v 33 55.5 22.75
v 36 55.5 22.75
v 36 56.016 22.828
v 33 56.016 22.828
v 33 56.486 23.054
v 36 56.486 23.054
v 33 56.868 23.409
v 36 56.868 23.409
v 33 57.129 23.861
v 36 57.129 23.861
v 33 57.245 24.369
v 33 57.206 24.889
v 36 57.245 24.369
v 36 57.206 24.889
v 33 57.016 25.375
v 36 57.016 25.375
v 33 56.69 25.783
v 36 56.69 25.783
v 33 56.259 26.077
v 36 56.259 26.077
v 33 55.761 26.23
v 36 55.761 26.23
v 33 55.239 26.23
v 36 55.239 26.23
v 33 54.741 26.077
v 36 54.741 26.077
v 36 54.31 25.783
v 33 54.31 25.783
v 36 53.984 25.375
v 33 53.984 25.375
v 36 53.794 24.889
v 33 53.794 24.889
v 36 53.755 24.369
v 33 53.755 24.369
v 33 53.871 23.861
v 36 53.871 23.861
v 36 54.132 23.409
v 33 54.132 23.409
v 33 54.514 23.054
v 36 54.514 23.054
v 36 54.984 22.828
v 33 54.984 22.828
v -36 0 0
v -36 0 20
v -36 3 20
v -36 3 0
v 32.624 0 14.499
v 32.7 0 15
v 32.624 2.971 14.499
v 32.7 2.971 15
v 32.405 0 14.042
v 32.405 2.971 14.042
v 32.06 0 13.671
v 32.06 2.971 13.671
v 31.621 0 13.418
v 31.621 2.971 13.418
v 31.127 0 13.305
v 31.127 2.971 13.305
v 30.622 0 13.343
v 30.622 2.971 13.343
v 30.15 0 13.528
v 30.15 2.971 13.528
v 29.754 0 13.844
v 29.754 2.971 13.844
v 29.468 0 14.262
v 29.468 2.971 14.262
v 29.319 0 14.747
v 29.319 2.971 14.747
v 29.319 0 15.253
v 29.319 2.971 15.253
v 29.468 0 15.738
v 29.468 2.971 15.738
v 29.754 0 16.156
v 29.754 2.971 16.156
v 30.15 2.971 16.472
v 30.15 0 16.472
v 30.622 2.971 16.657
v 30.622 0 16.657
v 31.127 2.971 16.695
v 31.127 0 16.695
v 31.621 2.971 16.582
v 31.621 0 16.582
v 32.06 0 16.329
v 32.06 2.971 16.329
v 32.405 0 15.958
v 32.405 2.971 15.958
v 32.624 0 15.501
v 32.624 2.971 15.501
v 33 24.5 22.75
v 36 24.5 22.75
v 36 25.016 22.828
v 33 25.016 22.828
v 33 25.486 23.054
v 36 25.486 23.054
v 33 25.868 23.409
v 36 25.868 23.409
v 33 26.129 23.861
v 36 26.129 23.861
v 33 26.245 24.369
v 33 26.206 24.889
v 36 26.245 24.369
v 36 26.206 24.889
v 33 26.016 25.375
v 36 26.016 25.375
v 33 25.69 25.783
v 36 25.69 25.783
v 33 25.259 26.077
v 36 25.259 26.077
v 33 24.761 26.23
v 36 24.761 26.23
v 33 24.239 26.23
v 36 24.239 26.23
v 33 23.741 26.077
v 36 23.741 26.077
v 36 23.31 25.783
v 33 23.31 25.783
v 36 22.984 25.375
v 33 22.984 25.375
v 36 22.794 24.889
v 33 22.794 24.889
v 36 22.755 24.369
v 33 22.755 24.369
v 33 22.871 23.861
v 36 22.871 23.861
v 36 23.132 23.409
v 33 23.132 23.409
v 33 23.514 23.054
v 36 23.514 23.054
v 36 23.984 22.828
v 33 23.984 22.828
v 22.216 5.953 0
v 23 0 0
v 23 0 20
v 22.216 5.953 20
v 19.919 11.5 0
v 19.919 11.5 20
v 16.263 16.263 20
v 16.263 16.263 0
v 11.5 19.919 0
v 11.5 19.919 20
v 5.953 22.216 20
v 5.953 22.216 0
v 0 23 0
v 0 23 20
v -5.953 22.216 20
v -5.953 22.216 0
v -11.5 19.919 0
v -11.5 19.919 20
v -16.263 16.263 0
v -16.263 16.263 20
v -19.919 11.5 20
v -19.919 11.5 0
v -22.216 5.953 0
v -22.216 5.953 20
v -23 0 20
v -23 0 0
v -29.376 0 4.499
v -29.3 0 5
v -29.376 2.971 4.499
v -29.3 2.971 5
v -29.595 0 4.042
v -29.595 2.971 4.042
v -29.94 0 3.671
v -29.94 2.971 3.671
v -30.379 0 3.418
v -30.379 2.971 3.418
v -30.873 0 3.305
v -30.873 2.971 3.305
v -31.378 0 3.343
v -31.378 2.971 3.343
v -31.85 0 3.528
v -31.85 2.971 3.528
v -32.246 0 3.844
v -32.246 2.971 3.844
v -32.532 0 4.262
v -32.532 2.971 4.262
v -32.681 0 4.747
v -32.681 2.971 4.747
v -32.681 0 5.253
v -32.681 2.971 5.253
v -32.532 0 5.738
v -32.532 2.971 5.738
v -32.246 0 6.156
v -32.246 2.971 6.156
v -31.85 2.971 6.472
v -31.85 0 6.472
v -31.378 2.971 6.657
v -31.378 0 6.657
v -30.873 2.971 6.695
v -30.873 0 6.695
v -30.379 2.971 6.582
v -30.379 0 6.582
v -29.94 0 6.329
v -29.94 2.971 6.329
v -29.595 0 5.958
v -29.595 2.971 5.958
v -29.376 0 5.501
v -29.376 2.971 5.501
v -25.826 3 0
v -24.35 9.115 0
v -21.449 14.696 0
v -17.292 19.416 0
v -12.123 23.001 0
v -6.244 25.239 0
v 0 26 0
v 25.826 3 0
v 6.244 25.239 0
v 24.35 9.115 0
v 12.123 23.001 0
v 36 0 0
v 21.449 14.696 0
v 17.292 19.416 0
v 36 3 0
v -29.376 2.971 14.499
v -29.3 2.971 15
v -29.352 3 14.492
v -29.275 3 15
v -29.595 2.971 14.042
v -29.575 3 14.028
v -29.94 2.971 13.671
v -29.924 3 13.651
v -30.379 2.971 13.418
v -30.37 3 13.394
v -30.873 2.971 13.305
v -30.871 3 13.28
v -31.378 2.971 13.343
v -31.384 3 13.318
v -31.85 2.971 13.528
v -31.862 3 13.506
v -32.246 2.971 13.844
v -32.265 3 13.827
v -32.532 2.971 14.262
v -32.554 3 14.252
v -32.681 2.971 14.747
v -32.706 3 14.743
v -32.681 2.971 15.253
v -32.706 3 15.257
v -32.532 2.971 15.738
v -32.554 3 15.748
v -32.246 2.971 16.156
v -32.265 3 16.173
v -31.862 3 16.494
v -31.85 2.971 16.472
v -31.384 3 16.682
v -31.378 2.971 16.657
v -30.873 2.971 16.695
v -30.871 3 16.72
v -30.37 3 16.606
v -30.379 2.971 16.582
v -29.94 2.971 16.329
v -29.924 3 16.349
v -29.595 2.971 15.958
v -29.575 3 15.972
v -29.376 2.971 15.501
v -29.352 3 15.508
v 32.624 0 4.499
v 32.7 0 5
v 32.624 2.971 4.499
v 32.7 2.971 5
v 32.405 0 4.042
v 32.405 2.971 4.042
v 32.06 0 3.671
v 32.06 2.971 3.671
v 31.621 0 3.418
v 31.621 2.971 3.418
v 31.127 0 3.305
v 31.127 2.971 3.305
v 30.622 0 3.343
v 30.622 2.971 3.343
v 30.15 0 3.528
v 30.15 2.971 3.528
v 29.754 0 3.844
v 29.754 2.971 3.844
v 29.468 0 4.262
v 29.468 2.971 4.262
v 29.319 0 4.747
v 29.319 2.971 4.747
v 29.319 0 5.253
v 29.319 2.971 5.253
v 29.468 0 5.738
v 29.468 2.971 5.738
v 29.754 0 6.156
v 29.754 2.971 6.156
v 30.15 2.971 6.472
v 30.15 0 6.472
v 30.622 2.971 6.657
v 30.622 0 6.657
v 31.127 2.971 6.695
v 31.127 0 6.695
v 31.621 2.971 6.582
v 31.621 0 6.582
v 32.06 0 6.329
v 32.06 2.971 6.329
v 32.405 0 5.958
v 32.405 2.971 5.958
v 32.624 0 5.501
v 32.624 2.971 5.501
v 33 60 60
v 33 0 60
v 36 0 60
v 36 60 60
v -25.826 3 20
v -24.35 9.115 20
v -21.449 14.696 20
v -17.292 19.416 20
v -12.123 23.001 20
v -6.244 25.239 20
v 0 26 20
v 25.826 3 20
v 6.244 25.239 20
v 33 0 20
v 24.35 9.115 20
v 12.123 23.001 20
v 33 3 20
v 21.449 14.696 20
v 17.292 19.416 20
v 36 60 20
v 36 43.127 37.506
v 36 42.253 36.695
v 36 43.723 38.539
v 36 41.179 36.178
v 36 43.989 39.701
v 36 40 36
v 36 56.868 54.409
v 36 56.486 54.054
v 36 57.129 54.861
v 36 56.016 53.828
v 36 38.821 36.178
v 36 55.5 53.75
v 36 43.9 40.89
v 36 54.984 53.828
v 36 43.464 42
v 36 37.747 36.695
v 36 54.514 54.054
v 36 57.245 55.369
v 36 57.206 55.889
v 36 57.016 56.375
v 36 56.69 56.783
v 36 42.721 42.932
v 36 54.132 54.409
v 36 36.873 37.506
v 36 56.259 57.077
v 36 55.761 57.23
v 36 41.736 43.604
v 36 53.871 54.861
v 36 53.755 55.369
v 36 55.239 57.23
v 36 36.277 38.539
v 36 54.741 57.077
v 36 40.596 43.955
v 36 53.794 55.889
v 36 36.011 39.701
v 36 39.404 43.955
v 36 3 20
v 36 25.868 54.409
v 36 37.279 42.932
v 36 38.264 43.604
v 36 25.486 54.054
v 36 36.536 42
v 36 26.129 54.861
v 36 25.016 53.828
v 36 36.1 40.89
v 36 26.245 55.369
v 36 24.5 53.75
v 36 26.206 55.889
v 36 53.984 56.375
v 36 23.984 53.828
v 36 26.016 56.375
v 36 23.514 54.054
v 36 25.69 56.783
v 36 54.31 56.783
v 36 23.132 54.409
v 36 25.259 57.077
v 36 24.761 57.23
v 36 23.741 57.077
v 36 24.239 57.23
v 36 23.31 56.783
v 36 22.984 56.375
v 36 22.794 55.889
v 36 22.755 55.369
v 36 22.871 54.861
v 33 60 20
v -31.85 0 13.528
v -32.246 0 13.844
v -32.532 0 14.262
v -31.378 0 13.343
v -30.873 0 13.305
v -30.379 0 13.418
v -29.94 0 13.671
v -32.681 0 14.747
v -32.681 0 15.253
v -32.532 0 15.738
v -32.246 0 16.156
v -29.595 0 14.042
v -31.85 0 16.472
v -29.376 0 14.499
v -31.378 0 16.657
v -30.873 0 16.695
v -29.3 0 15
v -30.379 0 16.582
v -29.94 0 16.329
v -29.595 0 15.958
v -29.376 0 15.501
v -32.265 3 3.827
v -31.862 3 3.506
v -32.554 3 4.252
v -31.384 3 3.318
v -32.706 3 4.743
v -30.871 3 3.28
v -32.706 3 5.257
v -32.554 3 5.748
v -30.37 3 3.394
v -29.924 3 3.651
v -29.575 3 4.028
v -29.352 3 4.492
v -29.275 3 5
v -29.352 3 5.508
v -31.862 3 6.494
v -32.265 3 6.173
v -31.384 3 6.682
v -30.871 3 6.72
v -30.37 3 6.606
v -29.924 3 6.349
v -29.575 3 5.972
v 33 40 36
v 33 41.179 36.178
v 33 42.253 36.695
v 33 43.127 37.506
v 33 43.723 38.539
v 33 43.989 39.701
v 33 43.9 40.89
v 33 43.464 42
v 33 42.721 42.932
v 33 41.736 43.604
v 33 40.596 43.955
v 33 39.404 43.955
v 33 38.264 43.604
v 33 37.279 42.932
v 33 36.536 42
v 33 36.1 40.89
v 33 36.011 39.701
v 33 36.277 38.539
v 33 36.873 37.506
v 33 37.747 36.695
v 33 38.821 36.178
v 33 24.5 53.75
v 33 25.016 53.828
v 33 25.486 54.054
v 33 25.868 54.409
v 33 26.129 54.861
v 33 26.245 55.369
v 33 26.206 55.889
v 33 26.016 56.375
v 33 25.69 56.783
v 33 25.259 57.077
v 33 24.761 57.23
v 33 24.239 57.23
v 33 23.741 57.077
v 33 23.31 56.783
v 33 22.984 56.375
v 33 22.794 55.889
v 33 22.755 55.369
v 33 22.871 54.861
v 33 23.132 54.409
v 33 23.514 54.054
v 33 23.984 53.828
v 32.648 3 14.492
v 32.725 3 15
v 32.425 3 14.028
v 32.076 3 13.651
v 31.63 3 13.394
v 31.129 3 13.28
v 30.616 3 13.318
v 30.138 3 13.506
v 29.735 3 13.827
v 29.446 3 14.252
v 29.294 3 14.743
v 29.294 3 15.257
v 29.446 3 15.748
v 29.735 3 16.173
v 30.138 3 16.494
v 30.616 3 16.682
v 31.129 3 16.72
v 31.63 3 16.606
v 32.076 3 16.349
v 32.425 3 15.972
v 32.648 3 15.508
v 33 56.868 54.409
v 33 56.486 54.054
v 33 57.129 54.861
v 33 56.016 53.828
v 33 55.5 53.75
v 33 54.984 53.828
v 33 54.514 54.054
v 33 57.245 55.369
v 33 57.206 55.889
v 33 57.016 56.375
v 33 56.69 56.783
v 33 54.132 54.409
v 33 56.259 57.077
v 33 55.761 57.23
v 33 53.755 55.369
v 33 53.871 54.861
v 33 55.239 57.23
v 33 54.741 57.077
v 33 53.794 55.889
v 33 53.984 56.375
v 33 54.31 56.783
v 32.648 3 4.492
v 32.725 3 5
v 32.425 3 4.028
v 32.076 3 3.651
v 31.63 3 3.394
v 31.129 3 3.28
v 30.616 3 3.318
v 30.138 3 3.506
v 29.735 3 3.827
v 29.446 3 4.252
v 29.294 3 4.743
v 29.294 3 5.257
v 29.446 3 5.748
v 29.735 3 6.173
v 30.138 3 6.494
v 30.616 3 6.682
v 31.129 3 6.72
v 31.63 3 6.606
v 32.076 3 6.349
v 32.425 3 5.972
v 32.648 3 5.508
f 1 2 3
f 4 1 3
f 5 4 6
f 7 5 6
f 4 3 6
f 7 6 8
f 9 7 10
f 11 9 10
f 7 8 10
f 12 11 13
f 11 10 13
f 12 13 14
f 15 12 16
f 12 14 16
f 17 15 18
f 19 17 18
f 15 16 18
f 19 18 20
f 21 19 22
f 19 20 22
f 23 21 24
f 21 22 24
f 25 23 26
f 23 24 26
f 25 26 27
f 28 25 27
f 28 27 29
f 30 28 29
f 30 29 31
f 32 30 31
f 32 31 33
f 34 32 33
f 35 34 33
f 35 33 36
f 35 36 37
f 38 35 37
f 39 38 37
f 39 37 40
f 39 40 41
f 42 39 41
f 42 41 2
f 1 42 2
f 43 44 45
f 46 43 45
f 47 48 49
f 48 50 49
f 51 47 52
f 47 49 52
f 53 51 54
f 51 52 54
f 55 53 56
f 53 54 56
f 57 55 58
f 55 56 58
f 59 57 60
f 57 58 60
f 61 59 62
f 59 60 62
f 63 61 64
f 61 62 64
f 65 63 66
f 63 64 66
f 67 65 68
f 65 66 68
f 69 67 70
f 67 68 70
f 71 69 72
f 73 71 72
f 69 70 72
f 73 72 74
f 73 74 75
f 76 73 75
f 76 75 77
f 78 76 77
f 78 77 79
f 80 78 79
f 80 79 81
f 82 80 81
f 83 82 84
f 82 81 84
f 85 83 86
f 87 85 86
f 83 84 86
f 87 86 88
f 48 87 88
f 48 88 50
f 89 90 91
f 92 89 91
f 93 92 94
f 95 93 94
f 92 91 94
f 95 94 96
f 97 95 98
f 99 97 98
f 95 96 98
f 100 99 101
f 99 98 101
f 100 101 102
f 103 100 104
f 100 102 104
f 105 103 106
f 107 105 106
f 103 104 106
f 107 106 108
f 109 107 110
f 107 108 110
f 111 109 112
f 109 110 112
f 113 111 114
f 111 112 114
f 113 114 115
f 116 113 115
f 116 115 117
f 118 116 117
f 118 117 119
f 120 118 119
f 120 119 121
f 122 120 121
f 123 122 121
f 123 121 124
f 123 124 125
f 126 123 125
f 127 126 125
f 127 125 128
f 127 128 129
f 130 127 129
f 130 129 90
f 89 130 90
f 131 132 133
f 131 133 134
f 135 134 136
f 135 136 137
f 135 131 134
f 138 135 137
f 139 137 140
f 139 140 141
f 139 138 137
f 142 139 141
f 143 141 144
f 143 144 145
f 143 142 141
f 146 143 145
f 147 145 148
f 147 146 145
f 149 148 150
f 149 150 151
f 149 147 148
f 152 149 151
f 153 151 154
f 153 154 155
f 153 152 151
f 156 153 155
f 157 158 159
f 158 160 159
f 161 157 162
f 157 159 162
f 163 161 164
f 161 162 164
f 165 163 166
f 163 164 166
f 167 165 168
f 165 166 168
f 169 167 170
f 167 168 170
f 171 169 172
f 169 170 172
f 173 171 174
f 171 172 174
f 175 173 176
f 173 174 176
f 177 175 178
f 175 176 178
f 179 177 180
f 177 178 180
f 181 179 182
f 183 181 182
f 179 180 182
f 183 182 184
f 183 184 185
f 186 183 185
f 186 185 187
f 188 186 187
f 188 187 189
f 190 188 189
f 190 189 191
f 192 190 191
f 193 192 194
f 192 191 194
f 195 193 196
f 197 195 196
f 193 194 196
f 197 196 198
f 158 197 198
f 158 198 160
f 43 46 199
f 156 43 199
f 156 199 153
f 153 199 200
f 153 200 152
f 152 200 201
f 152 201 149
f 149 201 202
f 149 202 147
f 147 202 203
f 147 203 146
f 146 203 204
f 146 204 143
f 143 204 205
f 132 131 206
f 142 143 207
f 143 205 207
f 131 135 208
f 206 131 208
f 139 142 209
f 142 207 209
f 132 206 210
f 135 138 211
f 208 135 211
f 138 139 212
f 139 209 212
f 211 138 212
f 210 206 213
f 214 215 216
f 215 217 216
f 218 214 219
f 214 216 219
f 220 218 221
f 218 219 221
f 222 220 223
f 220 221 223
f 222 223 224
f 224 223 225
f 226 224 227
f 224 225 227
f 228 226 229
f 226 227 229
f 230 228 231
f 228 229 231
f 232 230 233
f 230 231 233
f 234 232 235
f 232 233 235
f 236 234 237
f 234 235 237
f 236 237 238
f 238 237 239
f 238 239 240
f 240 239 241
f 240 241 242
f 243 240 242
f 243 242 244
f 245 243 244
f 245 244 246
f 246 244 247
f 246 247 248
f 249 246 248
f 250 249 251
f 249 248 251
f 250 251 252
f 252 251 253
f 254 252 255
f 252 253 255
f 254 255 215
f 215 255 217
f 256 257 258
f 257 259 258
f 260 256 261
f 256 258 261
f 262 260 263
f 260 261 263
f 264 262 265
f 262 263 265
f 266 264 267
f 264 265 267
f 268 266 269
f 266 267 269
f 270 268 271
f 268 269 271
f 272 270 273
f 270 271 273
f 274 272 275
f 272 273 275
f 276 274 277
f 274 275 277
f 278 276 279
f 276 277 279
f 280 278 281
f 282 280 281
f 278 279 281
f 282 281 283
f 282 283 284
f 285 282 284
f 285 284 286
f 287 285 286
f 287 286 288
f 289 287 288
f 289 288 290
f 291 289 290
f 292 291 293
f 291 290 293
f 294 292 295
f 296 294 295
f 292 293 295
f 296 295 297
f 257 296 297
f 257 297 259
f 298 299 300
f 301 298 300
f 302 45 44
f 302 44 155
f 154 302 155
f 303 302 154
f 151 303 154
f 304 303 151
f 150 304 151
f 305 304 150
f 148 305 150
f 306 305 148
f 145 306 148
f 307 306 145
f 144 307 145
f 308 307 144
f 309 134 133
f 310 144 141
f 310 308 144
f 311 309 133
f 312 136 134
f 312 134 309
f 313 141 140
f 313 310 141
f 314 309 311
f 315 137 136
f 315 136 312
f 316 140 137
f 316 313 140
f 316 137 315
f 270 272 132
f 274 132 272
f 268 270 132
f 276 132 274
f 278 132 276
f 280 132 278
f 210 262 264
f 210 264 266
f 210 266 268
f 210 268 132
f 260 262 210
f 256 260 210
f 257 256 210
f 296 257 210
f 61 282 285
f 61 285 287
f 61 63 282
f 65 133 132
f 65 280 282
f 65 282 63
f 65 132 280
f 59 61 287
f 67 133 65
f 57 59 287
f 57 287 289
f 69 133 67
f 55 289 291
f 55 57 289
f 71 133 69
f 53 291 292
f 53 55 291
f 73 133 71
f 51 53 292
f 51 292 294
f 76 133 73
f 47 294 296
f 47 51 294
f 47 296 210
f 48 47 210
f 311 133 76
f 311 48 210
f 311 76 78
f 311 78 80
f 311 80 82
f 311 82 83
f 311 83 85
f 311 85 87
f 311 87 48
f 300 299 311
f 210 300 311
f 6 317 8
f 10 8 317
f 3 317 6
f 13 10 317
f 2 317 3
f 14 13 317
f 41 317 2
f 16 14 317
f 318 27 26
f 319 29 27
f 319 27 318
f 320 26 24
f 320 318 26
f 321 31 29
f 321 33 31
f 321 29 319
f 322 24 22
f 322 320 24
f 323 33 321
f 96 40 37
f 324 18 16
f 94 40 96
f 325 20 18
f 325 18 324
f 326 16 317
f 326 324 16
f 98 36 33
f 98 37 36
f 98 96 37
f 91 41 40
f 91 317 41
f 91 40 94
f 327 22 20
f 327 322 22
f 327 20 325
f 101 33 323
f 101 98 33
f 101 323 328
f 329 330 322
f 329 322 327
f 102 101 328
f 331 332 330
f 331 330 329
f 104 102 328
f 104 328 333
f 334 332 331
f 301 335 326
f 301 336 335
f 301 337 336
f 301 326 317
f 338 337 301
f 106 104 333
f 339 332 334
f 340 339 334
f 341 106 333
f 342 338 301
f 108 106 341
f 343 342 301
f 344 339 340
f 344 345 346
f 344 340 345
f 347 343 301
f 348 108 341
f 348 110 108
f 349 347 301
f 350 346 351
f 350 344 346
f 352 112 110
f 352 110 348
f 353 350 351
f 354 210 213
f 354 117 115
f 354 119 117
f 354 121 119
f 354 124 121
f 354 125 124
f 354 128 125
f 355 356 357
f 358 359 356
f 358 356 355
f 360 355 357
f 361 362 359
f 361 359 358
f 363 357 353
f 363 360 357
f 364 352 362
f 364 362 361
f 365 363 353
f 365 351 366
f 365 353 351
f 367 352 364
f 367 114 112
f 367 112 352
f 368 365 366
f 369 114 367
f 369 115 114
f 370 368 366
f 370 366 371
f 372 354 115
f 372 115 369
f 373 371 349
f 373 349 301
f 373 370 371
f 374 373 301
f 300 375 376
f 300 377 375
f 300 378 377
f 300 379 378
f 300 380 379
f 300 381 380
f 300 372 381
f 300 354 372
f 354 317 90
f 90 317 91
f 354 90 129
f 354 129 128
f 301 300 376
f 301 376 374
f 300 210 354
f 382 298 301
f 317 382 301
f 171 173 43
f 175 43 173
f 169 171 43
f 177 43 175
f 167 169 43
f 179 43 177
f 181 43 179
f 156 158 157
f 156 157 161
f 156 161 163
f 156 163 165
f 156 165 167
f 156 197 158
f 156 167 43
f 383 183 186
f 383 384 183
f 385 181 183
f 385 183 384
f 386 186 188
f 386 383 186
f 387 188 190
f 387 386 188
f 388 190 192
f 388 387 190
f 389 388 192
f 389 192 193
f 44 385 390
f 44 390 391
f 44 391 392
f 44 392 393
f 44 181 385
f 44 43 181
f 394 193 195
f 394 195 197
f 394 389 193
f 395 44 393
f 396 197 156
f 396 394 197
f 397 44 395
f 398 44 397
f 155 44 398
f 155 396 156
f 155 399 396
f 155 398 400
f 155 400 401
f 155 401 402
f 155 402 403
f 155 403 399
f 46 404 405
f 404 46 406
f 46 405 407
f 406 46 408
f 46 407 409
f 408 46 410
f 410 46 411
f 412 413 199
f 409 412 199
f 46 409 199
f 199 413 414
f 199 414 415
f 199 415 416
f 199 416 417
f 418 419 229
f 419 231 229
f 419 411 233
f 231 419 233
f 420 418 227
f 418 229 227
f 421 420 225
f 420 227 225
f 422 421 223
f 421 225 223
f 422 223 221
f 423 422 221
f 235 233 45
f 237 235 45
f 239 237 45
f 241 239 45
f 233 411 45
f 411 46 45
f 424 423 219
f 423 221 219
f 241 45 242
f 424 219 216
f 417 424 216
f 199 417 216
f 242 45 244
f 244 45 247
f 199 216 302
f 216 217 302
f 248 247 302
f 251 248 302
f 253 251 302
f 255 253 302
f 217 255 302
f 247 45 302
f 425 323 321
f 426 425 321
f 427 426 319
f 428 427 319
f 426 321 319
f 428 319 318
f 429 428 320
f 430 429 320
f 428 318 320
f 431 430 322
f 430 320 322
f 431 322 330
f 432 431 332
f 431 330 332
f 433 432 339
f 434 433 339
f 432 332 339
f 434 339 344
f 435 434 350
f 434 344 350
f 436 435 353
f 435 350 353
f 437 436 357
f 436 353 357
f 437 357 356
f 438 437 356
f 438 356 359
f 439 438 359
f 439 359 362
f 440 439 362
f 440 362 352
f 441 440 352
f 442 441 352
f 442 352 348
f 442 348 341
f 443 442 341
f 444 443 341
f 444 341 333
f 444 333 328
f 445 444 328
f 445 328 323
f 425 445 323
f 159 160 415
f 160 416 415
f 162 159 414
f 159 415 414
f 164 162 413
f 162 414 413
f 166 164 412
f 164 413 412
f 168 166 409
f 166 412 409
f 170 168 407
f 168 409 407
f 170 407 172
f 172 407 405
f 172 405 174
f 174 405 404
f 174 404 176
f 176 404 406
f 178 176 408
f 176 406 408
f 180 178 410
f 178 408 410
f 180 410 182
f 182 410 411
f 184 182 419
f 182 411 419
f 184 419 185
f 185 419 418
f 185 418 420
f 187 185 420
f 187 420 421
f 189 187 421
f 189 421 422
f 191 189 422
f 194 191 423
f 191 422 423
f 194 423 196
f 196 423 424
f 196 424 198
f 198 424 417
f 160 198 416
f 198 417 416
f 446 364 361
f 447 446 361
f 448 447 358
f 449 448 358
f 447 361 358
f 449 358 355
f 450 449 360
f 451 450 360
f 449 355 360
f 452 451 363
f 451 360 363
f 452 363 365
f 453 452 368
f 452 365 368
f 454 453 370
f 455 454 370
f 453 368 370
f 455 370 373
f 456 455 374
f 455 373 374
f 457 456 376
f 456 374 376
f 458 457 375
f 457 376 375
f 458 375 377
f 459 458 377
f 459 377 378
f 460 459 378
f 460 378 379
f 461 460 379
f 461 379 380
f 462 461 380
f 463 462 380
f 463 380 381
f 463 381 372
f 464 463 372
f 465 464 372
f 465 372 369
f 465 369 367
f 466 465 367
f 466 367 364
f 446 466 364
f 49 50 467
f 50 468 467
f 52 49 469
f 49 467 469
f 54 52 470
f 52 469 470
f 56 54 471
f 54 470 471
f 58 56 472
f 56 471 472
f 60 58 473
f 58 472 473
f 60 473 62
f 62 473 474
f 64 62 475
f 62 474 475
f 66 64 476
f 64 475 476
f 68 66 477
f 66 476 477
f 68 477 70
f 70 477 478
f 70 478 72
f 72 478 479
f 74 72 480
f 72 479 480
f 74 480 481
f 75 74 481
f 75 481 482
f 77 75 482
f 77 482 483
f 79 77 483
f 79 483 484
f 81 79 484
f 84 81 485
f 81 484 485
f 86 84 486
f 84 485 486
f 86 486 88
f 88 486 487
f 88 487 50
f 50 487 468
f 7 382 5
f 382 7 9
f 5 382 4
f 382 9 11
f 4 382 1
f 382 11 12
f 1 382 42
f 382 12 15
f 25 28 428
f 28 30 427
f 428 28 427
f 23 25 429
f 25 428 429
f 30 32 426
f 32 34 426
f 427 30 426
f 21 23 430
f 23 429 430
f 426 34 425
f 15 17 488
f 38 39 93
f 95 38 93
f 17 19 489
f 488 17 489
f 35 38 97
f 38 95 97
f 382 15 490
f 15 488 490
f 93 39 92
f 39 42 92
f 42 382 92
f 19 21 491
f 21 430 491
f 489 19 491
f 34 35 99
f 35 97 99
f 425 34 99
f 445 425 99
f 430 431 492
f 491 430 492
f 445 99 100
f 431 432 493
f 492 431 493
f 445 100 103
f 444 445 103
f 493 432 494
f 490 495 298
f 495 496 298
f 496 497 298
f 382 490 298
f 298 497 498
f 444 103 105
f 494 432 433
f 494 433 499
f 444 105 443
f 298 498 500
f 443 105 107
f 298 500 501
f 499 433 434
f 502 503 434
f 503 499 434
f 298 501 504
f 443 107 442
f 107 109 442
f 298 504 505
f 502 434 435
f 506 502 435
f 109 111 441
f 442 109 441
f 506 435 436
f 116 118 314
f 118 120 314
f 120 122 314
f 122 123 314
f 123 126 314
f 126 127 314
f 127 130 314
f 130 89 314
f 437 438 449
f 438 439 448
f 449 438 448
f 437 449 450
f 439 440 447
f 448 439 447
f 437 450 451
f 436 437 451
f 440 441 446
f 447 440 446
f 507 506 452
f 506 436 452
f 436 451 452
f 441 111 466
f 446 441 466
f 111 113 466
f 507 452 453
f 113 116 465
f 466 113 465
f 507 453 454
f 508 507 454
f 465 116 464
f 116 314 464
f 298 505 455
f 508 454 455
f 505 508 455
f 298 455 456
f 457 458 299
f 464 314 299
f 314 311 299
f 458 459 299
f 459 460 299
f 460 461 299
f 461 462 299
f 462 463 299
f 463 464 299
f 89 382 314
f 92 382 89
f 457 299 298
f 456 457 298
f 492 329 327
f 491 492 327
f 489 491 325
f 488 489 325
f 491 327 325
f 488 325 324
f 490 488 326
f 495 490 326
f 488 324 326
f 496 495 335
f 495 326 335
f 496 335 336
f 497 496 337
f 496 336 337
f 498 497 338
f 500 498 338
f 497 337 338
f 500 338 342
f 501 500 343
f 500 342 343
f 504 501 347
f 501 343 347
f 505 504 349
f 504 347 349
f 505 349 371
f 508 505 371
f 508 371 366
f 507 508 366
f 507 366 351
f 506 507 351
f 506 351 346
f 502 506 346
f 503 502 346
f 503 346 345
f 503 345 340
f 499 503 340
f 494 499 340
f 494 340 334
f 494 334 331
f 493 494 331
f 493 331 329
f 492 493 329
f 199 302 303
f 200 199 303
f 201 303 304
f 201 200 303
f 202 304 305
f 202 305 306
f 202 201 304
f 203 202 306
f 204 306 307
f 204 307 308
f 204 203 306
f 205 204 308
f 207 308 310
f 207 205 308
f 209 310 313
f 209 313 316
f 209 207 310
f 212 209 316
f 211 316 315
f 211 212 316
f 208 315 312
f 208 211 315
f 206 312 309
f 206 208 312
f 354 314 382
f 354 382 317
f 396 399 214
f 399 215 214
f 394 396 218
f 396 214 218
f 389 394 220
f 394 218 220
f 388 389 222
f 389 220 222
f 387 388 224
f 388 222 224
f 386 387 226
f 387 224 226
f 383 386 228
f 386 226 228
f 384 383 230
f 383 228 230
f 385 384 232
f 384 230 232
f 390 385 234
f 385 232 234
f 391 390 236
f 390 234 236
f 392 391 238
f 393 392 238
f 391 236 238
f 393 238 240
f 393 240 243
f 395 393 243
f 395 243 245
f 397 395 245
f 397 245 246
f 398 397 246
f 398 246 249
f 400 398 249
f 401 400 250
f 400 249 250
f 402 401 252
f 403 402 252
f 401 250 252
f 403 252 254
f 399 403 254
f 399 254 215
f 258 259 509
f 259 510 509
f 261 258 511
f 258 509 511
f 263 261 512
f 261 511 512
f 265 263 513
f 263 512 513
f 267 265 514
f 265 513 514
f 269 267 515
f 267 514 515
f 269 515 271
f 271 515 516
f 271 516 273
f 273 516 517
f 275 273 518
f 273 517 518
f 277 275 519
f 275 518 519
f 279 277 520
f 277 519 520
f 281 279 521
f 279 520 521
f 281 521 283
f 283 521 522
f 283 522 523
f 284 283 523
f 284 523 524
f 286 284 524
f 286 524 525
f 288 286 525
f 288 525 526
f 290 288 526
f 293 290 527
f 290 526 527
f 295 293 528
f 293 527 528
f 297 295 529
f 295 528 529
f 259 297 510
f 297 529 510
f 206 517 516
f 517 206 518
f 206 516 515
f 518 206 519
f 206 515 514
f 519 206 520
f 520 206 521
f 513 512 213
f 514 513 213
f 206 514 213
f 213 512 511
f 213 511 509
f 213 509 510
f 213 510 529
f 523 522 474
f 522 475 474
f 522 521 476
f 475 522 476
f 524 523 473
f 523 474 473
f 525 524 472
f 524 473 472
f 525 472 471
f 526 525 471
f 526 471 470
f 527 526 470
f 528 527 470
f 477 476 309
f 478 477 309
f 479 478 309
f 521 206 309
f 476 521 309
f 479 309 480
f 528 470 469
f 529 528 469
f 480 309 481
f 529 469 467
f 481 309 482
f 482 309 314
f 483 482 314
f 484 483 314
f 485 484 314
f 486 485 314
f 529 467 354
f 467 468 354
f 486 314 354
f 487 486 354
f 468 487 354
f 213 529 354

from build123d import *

# Parameters (mm, degrees)
EXTRUDE_1_DEPTH     = 20
SKETCH_2_W          = 13
SKETCH_2_H          = 3
EXTRUDE_2_DEPTH     = 20
SKETCH_5_W          = 3
SKETCH_5_H          = 40
EXTRUDE_3_DEPTH     = 60
CUT_EXTRUDE_1_REACH = 113.283
SKETCH_6_R          = 4
SKETCH_6_R_2        = 1.75


# Read off the part's stored shape, not the designer's step: M3 すきま穴1
with BuildPart() as part:
    # ｽｹｯﾁ1 → ﾎﾞｽ - 押し出し1 (new body)
    with BuildSketch(Plane.XY):
        with BuildLine():
            Line((-23, 0), (-26, 0))
            ThreePointArc((-26, 0), (0, 26), (26, 0))
            Line((26, 0), (23, 0))
            ThreePointArc((23, 0), (0, 23), (-23, 0))
        make_face()
    extrude(amount=EXTRUDE_1_DEPTH)

    # ｽｹｯﾁ2 → ﾎﾞｽ - 押し出し2 (add)
    with BuildSketch(Plane.XY.offset(20)):
        with Locations((-29.5, 1.5)):
            Rectangle(SKETCH_2_W, SKETCH_2_H)
        with Locations((29.5, 1.5)):
            Rectangle(SKETCH_2_W, SKETCH_2_H)
    extrude(amount=-EXTRUDE_2_DEPTH)

    # M3 すきま穴1 outline → M3 すきま穴1 (revolve, cut)
    with BuildSketch(Plane(origin=(31, 0, 15), x_dir=(1, 0, 0), z_dir=(0, 0, 1))):
        Polygon((0, 0), (1.7, 0), (1.7, 2.97124079), (1.725, 3), (0, 3), align=None)
    revolve(axis=Axis((31, 0, 15), (0, 1, 0)), mode=Mode.SUBTRACT)

    # Hole Wizard M3 _1 2 outline → Hole Wizard M3 _1 2 (revolve, cut)
    with BuildSketch(Plane(origin=(31, 0, 5), x_dir=(1, 0, 0), z_dir=(0, 0, 1))):
        Polygon((0, 0), (1.7, 0), (1.7, 2.97124079), (1.725, 3), (0, 3), align=None)
    revolve(axis=Axis((31, 0, 5), (0, 1, 0)), mode=Mode.SUBTRACT)

    # Hole Wizard M3 _1 3 outline → Hole Wizard M3 _1 3 (revolve, cut)
    with BuildSketch(Plane(origin=(-31, 0, 15), x_dir=(1, 0, 0), z_dir=(0, 0, 1))):
        Polygon((0, 0), (1.7, 0), (1.7, 2.97124079), (1.725, 3), (0, 3), align=None)
    revolve(axis=Axis((-31, 0, 15), (0, 1, 0)), mode=Mode.SUBTRACT)

    # Hole Wizard M3 _1 4 outline → Hole Wizard M3 _1 4 (revolve, cut)
    with BuildSketch(Plane(origin=(-31, 0, 5), x_dir=(1, 0, 0), z_dir=(0, 0, 1))):
        Polygon((0, 0), (1.7, 0), (1.7, 2.97124079), (1.725, 3), (0, 3), align=None)
    revolve(axis=Axis((-31, 0, 5), (0, 1, 0)), mode=Mode.SUBTRACT)

    # ｽｹｯﾁ5 → ﾎﾞｽ - 押し出し3 (add)
    with BuildSketch(Plane.XZ):
        with Locations((34.5, 40)):
            Rectangle(SKETCH_5_W, SKETCH_5_H)
    extrude(amount=-EXTRUDE_3_DEPTH)

    # ｽｹｯﾁ6 → ｶｯﾄ - 押し出し1 (cut, up to next)
    with BuildSketch(Plane(origin=(36, 0, 0), x_dir=(0, 0, -1), z_dir=(1, 0, 0)), mode=Mode.PRIVATE) as cut_extrude_1_sk1:
        with Locations((-40, 40)):
            Circle(SKETCH_6_R)
    cut_extrude_1_tool1 = extrude(cut_extrude_1_sk1.sketch, amount=-CUT_EXTRUDE_1_REACH, mode=Mode.PRIVATE) & part.part
    # ｽｹｯﾁ6 → ｶｯﾄ - 押し出し1 (cut, up to next)
    with BuildSketch(Plane(origin=(36, 0, 0), x_dir=(0, 0, -1), z_dir=(1, 0, 0)), mode=Mode.PRIVATE) as cut_extrude_1_sk2:
        with Locations((-24.5, 55.5)):
            Circle(SKETCH_6_R_2)
    cut_extrude_1_tool2 = extrude(cut_extrude_1_sk2.sketch, amount=-CUT_EXTRUDE_1_REACH, mode=Mode.PRIVATE) & part.part
    # ｽｹｯﾁ6 → ｶｯﾄ - 押し出し1 (cut, up to next)
    with BuildSketch(Plane(origin=(36, 0, 0), x_dir=(0, 0, -1), z_dir=(1, 0, 0)), mode=Mode.PRIVATE) as cut_extrude_1_sk3:
        with Locations((-24.5, 24.5)):
            Circle(SKETCH_6_R_2)
    cut_extrude_1_tool3 = extrude(cut_extrude_1_sk3.sketch, amount=-CUT_EXTRUDE_1_REACH, mode=Mode.PRIVATE) & part.part
    # ｽｹｯﾁ6 → ｶｯﾄ - 押し出し1 (cut, up to next)
    with BuildSketch(Plane(origin=(36, 0, 0), x_dir=(0, 0, -1), z_dir=(1, 0, 0)), mode=Mode.PRIVATE) as cut_extrude_1_sk4:
        with Locations((-55.5, 24.5)):
            Circle(SKETCH_6_R_2)
    cut_extrude_1_tool4 = extrude(cut_extrude_1_sk4.sketch, amount=-CUT_EXTRUDE_1_REACH, mode=Mode.PRIVATE) & part.part
    # ｽｹｯﾁ6 → ｶｯﾄ - 押し出し1 (cut, up to next)
    with BuildSketch(Plane(origin=(36, 0, 0), x_dir=(0, 0, -1), z_dir=(1, 0, 0)), mode=Mode.PRIVATE) as cut_extrude_1_sk5:
        with Locations((-55.5, 55.5)):
            Circle(SKETCH_6_R_2)
    cut_extrude_1_tool5 = extrude(cut_extrude_1_sk5.sketch, amount=-CUT_EXTRUDE_1_REACH, mode=Mode.PRIVATE) & part.part
    add(cut_extrude_1_tool1.solids().sort_by_distance((36, 40, 40))[0], mode=Mode.SUBTRACT)
    add(cut_extrude_1_tool2.solids().sort_by_distance((36, 55.5, 24.5))[0], mode=Mode.SUBTRACT)
    add(cut_extrude_1_tool3.solids().sort_by_distance((36, 24.5, 24.5))[0], mode=Mode.SUBTRACT)
    add(cut_extrude_1_tool4.solids().sort_by_distance((36, 24.5, 55.5))[0], mode=Mode.SUBTRACT)
    add(cut_extrude_1_tool5.solids().sort_by_distance((36, 55.5, 55.5))[0], mode=Mode.SUBTRACT)


solid = part.part
